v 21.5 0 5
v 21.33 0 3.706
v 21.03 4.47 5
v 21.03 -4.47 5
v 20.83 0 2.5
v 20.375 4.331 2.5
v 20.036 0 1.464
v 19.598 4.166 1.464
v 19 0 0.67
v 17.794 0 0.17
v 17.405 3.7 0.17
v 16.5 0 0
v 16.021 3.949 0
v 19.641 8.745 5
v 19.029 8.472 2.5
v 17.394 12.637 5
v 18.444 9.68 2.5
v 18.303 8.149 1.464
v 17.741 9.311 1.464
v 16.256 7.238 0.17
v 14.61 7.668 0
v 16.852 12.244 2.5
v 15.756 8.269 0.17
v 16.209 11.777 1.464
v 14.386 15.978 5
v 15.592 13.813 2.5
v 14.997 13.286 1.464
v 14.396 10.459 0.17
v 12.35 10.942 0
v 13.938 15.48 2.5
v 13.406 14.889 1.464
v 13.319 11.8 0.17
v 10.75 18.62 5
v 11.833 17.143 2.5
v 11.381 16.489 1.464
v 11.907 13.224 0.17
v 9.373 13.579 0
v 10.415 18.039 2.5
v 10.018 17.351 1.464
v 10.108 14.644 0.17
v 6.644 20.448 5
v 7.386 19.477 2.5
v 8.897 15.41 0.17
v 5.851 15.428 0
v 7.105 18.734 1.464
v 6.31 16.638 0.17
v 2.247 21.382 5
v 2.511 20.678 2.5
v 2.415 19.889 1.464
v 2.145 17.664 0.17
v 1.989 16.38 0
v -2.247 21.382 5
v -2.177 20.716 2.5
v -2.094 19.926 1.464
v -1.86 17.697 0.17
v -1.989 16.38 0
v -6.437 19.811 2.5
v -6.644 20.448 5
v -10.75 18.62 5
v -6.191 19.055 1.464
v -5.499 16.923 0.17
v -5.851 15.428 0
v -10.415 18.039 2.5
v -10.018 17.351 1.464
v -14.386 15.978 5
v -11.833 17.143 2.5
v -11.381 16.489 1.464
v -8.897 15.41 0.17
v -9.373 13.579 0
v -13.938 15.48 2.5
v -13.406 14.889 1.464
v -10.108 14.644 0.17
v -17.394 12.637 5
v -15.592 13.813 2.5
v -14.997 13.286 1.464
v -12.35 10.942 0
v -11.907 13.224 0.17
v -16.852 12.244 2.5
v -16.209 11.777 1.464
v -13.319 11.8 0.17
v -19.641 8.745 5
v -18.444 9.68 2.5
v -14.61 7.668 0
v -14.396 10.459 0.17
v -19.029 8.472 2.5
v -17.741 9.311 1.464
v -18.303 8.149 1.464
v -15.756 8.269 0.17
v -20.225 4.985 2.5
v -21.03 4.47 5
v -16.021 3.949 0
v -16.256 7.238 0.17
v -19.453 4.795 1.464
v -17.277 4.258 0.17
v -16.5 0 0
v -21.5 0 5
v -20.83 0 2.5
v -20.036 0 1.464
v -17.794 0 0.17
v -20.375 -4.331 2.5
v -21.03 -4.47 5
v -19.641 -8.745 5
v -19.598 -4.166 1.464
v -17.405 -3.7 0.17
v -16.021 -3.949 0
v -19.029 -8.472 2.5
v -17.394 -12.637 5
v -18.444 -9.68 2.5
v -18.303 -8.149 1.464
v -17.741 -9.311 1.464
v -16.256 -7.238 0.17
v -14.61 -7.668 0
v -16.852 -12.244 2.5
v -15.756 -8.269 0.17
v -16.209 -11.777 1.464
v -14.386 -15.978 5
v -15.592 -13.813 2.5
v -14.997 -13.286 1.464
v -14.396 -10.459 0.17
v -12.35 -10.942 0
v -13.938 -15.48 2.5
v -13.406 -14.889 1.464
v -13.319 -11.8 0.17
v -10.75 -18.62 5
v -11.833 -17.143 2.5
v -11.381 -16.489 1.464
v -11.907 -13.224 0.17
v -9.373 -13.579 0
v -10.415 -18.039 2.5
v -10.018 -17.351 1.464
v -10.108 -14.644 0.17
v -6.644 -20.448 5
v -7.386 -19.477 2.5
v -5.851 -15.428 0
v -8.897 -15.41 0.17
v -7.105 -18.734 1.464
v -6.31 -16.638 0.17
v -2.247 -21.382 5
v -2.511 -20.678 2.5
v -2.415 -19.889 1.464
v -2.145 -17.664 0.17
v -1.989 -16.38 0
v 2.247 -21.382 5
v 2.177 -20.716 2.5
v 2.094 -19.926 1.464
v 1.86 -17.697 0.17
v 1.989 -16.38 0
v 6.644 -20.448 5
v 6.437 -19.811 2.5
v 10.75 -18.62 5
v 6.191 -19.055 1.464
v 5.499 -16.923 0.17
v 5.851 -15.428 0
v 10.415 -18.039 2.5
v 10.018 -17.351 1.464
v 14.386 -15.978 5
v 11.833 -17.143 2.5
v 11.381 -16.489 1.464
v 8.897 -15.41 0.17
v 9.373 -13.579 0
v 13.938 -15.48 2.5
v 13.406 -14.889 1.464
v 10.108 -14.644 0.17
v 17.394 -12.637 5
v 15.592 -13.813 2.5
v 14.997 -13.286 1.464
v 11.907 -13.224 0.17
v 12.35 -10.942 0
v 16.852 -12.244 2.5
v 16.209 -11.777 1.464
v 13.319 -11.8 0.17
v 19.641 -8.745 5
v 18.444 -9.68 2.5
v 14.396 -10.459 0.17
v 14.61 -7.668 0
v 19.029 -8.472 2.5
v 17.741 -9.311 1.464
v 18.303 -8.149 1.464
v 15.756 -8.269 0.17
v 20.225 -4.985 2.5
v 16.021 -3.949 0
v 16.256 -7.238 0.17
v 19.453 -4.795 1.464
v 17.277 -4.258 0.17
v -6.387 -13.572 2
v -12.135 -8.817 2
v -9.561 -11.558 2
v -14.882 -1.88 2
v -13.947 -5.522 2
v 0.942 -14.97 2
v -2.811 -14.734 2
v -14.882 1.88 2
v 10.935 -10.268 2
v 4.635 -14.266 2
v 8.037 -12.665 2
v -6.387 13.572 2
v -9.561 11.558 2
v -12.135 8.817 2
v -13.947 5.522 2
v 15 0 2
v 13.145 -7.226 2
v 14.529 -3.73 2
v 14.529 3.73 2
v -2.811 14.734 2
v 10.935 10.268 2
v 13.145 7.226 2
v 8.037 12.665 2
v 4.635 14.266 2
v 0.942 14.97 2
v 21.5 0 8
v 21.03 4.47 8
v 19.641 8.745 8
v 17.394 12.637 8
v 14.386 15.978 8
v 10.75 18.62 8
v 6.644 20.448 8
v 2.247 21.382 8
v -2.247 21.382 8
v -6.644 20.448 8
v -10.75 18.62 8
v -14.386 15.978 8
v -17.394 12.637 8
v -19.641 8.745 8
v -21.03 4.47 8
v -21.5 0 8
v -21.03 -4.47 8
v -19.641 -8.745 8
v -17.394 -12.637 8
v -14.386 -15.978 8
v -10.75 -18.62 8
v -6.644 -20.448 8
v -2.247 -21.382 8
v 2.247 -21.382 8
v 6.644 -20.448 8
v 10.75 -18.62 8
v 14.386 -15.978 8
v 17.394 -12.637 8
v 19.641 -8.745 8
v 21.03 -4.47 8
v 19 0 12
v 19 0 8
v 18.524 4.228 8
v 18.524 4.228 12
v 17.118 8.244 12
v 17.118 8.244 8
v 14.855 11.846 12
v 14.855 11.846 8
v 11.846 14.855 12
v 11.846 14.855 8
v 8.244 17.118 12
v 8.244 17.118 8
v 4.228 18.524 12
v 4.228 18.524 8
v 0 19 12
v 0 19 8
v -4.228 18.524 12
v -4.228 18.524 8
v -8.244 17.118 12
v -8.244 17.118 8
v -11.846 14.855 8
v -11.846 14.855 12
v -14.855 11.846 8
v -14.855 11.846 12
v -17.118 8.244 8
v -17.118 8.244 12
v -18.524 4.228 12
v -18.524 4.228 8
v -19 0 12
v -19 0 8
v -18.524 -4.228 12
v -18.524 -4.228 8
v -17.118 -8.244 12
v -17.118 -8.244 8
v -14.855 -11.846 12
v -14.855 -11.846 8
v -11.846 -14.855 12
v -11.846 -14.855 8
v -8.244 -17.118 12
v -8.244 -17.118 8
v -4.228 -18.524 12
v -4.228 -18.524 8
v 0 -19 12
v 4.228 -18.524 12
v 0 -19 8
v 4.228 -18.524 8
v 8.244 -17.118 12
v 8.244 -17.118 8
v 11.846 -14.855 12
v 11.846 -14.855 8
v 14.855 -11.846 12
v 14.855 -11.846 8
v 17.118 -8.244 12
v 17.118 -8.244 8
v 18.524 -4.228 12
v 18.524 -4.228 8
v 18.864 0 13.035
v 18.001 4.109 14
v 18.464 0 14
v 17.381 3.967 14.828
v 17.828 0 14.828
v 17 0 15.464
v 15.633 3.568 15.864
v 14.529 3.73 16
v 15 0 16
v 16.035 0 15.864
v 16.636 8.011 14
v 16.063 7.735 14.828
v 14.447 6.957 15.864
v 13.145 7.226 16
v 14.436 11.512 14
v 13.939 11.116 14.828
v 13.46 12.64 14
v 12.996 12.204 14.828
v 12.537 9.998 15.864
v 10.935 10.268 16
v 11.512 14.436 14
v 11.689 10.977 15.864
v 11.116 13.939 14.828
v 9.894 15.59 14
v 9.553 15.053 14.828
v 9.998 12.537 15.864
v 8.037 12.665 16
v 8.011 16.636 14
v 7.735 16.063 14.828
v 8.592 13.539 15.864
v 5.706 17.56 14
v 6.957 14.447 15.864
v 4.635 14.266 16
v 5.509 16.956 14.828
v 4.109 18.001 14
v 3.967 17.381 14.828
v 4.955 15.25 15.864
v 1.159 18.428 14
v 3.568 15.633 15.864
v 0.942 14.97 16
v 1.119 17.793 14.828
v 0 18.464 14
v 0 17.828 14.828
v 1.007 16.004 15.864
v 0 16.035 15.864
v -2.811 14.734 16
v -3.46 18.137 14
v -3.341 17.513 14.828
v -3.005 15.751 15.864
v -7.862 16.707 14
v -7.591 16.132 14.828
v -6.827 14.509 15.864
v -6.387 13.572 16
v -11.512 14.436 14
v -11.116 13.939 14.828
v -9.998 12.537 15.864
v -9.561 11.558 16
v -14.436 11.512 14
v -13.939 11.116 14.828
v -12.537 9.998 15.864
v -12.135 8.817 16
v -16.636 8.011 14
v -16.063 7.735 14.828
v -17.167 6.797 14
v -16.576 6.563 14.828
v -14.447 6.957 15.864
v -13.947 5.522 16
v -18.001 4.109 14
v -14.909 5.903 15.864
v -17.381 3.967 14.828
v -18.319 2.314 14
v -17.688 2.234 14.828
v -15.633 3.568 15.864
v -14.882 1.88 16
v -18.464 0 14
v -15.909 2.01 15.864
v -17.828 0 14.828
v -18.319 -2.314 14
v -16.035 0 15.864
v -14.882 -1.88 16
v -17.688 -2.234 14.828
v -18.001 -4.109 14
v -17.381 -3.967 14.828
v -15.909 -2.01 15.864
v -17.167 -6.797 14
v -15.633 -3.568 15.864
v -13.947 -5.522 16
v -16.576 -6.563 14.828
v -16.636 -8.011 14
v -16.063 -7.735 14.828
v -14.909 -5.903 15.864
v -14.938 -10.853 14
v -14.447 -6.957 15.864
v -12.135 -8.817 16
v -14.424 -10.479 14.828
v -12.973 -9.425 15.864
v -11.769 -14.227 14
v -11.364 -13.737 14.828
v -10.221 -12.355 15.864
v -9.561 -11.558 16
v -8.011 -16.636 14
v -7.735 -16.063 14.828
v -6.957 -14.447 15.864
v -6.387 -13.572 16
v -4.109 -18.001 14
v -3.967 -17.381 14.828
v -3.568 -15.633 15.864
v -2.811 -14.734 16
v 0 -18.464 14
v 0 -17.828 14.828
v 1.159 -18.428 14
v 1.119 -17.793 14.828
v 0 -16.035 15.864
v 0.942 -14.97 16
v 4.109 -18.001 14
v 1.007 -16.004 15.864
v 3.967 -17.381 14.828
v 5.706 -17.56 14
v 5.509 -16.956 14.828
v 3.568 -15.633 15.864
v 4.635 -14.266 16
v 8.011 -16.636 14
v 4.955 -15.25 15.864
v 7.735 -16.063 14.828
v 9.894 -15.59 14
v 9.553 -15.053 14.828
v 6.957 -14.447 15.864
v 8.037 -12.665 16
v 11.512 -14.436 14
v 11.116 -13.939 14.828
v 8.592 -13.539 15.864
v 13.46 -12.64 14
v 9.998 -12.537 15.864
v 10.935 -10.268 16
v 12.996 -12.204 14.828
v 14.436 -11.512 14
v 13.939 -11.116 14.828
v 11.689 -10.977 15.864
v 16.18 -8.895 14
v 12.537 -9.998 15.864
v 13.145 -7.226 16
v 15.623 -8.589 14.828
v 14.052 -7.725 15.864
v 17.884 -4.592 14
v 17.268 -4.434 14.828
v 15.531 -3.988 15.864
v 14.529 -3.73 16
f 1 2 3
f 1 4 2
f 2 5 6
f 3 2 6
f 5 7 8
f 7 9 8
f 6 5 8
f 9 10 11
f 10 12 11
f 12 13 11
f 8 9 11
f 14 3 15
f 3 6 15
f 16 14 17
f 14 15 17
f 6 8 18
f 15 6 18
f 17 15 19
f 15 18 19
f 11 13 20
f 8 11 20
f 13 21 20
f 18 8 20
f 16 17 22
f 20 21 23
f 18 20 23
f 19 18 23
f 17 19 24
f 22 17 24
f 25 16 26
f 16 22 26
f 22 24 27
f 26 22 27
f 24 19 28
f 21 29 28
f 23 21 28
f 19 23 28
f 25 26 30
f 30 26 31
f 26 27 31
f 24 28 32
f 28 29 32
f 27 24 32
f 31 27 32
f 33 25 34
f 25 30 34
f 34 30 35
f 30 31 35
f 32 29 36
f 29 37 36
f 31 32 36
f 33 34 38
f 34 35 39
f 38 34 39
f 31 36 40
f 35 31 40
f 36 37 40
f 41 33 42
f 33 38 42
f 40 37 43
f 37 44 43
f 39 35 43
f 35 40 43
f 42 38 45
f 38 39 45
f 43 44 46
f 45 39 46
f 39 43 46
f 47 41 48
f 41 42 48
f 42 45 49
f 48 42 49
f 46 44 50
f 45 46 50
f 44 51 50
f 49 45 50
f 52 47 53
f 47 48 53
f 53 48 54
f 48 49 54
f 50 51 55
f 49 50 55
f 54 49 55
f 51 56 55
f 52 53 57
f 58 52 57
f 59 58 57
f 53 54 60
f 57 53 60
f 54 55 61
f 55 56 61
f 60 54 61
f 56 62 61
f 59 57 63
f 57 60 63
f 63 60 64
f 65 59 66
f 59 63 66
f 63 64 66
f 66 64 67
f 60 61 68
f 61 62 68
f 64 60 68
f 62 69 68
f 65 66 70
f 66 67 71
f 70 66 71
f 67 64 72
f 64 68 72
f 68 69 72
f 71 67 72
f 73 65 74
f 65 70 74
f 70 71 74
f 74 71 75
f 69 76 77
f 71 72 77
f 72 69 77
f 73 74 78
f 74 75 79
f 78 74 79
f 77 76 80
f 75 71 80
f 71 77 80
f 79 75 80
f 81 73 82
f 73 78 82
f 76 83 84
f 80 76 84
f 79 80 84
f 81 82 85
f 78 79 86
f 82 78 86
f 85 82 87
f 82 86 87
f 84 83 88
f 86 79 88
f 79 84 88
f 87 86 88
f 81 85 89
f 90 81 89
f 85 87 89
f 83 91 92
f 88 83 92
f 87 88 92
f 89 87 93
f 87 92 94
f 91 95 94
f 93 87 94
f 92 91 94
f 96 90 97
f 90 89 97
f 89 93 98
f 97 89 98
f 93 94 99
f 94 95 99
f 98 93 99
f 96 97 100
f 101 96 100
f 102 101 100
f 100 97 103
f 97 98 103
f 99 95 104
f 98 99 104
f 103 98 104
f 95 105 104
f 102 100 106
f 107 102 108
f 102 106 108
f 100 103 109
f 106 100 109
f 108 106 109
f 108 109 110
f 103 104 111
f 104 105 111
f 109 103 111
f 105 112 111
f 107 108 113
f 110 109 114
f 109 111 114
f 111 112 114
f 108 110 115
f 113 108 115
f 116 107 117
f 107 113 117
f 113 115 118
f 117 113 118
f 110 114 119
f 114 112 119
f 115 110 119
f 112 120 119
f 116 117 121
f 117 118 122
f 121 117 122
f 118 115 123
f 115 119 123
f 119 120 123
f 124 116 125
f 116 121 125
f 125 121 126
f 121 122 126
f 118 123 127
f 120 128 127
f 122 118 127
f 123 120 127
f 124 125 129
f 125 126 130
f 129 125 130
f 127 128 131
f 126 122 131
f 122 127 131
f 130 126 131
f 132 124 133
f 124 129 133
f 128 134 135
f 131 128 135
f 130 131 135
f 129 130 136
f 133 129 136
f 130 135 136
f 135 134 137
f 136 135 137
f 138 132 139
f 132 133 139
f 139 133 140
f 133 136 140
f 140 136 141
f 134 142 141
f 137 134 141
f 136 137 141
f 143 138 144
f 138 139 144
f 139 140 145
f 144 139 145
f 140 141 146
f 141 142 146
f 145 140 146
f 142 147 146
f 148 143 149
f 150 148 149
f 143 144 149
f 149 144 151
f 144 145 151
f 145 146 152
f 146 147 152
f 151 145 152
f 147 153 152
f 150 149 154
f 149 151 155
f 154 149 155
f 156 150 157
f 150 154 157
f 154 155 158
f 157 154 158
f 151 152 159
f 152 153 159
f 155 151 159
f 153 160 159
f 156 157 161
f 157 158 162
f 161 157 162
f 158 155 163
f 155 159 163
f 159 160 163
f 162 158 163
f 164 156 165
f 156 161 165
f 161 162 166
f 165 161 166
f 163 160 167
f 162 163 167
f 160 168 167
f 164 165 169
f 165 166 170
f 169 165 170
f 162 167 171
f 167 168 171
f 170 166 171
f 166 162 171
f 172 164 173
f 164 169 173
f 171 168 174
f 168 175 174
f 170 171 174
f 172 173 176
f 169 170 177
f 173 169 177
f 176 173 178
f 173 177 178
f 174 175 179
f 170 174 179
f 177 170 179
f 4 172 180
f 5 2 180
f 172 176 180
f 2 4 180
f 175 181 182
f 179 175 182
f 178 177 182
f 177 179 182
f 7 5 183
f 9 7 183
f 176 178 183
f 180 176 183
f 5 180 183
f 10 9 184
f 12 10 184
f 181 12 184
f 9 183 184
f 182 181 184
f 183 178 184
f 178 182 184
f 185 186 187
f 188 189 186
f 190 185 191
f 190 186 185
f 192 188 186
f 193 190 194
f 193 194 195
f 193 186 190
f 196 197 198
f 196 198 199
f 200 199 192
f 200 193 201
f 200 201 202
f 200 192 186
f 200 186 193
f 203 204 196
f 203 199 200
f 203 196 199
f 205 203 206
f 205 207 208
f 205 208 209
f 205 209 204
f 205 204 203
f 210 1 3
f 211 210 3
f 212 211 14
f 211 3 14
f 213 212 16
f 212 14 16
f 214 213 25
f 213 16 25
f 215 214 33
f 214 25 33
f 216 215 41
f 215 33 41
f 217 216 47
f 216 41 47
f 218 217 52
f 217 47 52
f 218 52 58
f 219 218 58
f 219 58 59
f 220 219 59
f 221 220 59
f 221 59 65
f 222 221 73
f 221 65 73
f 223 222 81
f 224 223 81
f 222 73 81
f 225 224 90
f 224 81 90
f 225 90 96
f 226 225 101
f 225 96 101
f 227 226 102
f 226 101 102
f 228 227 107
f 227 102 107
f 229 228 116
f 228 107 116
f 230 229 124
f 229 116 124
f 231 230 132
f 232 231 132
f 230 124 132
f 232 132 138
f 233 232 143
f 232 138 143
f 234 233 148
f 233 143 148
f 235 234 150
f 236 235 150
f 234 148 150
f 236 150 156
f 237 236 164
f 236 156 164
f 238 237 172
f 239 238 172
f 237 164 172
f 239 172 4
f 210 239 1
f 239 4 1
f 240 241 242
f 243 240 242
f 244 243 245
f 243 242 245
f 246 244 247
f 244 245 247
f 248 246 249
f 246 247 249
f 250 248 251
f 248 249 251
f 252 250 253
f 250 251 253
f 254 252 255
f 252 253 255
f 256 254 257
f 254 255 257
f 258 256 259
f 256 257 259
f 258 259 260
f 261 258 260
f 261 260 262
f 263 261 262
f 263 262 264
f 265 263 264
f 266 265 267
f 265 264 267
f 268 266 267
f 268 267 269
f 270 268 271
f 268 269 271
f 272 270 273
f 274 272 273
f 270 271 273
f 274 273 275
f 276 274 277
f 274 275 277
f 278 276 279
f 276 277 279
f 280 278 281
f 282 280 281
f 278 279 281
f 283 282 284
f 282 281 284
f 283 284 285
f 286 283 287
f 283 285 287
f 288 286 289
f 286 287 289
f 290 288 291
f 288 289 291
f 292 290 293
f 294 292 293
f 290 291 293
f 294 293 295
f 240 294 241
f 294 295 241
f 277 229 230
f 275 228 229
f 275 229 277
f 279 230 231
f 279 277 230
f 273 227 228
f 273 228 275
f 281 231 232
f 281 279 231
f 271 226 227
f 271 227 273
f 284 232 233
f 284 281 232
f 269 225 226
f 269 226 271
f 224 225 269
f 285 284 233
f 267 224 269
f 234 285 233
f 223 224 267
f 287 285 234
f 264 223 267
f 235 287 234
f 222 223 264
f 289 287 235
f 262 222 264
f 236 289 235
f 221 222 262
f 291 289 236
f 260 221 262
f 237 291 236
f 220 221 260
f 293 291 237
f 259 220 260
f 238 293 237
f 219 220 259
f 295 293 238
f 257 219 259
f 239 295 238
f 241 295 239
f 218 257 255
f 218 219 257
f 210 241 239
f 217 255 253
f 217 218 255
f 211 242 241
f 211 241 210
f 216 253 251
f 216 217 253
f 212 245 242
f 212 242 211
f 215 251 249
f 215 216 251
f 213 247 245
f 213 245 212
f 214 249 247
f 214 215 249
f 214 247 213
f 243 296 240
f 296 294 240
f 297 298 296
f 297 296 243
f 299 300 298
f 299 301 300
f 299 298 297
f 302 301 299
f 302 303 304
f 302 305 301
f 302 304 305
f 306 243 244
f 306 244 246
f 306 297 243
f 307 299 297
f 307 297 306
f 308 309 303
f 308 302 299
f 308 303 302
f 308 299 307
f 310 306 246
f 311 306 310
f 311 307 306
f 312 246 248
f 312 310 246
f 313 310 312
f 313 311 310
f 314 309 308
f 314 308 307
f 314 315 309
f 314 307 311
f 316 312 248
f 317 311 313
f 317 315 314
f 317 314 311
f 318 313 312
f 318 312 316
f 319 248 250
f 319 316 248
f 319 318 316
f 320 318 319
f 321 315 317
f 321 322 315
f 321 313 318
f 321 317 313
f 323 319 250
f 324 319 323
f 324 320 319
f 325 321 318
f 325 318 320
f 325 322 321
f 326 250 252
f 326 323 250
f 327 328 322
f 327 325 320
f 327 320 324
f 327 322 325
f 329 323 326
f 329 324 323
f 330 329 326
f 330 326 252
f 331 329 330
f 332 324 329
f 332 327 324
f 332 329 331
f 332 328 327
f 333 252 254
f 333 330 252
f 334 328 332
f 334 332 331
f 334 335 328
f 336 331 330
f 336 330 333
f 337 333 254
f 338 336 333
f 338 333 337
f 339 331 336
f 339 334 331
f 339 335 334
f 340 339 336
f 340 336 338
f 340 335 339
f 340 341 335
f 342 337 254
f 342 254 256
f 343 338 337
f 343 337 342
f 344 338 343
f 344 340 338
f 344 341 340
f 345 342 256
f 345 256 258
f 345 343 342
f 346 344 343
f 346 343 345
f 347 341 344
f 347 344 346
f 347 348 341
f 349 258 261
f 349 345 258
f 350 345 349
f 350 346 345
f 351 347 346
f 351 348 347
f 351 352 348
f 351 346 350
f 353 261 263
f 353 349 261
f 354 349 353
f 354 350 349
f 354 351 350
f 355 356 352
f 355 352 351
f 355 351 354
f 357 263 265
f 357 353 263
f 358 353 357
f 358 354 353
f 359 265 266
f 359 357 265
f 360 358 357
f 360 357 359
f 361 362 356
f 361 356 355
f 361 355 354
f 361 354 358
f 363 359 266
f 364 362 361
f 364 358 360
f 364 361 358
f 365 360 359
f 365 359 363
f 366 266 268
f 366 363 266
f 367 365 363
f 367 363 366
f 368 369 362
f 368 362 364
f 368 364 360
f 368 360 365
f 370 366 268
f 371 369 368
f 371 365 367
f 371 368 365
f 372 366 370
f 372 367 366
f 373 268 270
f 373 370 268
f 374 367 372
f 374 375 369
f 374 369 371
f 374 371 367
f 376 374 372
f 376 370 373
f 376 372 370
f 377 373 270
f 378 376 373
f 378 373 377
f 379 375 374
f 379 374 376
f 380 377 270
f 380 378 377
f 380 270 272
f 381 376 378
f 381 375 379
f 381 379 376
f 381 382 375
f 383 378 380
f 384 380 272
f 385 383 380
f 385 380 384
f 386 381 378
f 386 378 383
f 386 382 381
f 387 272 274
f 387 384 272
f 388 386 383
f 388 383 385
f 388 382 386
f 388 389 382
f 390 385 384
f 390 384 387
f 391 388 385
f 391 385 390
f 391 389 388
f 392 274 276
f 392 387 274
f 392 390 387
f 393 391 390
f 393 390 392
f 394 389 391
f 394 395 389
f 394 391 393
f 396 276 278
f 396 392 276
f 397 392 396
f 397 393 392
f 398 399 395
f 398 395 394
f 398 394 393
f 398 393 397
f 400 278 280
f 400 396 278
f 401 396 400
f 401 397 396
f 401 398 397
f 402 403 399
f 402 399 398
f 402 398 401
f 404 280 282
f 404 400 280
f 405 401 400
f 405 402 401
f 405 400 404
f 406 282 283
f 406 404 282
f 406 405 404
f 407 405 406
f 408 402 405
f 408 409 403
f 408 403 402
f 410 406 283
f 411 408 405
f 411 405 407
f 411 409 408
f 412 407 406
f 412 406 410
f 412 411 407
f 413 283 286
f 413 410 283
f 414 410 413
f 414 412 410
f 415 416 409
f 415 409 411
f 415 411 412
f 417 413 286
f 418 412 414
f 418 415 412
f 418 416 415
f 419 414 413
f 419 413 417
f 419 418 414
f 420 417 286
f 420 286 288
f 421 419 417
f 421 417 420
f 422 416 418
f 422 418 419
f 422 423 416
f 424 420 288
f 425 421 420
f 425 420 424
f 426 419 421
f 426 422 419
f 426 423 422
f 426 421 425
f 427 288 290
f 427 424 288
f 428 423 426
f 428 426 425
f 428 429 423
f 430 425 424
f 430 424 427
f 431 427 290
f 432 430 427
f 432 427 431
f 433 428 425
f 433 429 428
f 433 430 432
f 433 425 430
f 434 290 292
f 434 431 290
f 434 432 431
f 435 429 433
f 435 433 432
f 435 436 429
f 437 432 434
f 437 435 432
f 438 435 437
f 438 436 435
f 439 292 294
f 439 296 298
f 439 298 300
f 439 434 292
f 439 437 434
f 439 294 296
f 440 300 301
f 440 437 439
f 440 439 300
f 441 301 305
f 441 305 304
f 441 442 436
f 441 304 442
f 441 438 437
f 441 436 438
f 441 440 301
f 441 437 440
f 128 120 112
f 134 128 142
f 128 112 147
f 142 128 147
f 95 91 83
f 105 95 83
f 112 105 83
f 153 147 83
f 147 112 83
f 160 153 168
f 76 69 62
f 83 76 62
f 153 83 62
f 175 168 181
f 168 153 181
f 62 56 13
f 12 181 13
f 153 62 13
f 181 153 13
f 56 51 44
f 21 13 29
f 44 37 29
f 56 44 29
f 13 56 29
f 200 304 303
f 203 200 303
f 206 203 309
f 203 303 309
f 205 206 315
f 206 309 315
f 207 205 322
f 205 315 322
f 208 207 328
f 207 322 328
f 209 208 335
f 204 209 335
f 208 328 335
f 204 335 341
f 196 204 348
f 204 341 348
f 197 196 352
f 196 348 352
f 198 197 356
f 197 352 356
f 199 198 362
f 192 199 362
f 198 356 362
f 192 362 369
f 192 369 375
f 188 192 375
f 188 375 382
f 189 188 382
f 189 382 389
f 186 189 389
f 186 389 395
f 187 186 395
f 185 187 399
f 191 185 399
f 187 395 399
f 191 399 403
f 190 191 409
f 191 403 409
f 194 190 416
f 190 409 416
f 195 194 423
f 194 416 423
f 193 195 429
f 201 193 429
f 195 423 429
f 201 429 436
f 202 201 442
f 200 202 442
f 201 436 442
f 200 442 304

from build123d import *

# Parameters (mm, degrees)
F0_R     = 21.5
F1_DEPTH = 8
F2_R     = 19
F3_DEPTH = 8
F4_R     = 4
F5_R     = 5
F6_R     = 15
F7_DEPTH = 14


with BuildPart() as f1:
    # F0 (on Top) → F1 (new body)
    with BuildSketch(Plane.XY):
        Circle(F0_R)
    extrude(amount=F1_DEPTH)

    # F2 (on face) → F3 (join)
    with BuildSketch(Plane.XY.offset(8)):
        Circle(F2_R)
    extrude(amount=F3_DEPTH)

    # F4
    f4_edges = [f1.edges().sort_by_distance(p)[0] for p in [
        (-19, 0, 16),
    ]]
    fillet(f4_edges, radius=F4_R)

    # F5
    f5_edges = [f1.edges().sort_by_distance(p)[0] for p in [
        (-21.5, 0, 0),
    ]]
    fillet(f5_edges, radius=F5_R)

    # F6 (on face) → F7 (cut)
    with BuildSketch(Plane.XY.offset(16)):
        Circle(F6_R)
    extrude(amount=-F7_DEPTH, mode=Mode.SUBTRACT)


solid = f1.part
